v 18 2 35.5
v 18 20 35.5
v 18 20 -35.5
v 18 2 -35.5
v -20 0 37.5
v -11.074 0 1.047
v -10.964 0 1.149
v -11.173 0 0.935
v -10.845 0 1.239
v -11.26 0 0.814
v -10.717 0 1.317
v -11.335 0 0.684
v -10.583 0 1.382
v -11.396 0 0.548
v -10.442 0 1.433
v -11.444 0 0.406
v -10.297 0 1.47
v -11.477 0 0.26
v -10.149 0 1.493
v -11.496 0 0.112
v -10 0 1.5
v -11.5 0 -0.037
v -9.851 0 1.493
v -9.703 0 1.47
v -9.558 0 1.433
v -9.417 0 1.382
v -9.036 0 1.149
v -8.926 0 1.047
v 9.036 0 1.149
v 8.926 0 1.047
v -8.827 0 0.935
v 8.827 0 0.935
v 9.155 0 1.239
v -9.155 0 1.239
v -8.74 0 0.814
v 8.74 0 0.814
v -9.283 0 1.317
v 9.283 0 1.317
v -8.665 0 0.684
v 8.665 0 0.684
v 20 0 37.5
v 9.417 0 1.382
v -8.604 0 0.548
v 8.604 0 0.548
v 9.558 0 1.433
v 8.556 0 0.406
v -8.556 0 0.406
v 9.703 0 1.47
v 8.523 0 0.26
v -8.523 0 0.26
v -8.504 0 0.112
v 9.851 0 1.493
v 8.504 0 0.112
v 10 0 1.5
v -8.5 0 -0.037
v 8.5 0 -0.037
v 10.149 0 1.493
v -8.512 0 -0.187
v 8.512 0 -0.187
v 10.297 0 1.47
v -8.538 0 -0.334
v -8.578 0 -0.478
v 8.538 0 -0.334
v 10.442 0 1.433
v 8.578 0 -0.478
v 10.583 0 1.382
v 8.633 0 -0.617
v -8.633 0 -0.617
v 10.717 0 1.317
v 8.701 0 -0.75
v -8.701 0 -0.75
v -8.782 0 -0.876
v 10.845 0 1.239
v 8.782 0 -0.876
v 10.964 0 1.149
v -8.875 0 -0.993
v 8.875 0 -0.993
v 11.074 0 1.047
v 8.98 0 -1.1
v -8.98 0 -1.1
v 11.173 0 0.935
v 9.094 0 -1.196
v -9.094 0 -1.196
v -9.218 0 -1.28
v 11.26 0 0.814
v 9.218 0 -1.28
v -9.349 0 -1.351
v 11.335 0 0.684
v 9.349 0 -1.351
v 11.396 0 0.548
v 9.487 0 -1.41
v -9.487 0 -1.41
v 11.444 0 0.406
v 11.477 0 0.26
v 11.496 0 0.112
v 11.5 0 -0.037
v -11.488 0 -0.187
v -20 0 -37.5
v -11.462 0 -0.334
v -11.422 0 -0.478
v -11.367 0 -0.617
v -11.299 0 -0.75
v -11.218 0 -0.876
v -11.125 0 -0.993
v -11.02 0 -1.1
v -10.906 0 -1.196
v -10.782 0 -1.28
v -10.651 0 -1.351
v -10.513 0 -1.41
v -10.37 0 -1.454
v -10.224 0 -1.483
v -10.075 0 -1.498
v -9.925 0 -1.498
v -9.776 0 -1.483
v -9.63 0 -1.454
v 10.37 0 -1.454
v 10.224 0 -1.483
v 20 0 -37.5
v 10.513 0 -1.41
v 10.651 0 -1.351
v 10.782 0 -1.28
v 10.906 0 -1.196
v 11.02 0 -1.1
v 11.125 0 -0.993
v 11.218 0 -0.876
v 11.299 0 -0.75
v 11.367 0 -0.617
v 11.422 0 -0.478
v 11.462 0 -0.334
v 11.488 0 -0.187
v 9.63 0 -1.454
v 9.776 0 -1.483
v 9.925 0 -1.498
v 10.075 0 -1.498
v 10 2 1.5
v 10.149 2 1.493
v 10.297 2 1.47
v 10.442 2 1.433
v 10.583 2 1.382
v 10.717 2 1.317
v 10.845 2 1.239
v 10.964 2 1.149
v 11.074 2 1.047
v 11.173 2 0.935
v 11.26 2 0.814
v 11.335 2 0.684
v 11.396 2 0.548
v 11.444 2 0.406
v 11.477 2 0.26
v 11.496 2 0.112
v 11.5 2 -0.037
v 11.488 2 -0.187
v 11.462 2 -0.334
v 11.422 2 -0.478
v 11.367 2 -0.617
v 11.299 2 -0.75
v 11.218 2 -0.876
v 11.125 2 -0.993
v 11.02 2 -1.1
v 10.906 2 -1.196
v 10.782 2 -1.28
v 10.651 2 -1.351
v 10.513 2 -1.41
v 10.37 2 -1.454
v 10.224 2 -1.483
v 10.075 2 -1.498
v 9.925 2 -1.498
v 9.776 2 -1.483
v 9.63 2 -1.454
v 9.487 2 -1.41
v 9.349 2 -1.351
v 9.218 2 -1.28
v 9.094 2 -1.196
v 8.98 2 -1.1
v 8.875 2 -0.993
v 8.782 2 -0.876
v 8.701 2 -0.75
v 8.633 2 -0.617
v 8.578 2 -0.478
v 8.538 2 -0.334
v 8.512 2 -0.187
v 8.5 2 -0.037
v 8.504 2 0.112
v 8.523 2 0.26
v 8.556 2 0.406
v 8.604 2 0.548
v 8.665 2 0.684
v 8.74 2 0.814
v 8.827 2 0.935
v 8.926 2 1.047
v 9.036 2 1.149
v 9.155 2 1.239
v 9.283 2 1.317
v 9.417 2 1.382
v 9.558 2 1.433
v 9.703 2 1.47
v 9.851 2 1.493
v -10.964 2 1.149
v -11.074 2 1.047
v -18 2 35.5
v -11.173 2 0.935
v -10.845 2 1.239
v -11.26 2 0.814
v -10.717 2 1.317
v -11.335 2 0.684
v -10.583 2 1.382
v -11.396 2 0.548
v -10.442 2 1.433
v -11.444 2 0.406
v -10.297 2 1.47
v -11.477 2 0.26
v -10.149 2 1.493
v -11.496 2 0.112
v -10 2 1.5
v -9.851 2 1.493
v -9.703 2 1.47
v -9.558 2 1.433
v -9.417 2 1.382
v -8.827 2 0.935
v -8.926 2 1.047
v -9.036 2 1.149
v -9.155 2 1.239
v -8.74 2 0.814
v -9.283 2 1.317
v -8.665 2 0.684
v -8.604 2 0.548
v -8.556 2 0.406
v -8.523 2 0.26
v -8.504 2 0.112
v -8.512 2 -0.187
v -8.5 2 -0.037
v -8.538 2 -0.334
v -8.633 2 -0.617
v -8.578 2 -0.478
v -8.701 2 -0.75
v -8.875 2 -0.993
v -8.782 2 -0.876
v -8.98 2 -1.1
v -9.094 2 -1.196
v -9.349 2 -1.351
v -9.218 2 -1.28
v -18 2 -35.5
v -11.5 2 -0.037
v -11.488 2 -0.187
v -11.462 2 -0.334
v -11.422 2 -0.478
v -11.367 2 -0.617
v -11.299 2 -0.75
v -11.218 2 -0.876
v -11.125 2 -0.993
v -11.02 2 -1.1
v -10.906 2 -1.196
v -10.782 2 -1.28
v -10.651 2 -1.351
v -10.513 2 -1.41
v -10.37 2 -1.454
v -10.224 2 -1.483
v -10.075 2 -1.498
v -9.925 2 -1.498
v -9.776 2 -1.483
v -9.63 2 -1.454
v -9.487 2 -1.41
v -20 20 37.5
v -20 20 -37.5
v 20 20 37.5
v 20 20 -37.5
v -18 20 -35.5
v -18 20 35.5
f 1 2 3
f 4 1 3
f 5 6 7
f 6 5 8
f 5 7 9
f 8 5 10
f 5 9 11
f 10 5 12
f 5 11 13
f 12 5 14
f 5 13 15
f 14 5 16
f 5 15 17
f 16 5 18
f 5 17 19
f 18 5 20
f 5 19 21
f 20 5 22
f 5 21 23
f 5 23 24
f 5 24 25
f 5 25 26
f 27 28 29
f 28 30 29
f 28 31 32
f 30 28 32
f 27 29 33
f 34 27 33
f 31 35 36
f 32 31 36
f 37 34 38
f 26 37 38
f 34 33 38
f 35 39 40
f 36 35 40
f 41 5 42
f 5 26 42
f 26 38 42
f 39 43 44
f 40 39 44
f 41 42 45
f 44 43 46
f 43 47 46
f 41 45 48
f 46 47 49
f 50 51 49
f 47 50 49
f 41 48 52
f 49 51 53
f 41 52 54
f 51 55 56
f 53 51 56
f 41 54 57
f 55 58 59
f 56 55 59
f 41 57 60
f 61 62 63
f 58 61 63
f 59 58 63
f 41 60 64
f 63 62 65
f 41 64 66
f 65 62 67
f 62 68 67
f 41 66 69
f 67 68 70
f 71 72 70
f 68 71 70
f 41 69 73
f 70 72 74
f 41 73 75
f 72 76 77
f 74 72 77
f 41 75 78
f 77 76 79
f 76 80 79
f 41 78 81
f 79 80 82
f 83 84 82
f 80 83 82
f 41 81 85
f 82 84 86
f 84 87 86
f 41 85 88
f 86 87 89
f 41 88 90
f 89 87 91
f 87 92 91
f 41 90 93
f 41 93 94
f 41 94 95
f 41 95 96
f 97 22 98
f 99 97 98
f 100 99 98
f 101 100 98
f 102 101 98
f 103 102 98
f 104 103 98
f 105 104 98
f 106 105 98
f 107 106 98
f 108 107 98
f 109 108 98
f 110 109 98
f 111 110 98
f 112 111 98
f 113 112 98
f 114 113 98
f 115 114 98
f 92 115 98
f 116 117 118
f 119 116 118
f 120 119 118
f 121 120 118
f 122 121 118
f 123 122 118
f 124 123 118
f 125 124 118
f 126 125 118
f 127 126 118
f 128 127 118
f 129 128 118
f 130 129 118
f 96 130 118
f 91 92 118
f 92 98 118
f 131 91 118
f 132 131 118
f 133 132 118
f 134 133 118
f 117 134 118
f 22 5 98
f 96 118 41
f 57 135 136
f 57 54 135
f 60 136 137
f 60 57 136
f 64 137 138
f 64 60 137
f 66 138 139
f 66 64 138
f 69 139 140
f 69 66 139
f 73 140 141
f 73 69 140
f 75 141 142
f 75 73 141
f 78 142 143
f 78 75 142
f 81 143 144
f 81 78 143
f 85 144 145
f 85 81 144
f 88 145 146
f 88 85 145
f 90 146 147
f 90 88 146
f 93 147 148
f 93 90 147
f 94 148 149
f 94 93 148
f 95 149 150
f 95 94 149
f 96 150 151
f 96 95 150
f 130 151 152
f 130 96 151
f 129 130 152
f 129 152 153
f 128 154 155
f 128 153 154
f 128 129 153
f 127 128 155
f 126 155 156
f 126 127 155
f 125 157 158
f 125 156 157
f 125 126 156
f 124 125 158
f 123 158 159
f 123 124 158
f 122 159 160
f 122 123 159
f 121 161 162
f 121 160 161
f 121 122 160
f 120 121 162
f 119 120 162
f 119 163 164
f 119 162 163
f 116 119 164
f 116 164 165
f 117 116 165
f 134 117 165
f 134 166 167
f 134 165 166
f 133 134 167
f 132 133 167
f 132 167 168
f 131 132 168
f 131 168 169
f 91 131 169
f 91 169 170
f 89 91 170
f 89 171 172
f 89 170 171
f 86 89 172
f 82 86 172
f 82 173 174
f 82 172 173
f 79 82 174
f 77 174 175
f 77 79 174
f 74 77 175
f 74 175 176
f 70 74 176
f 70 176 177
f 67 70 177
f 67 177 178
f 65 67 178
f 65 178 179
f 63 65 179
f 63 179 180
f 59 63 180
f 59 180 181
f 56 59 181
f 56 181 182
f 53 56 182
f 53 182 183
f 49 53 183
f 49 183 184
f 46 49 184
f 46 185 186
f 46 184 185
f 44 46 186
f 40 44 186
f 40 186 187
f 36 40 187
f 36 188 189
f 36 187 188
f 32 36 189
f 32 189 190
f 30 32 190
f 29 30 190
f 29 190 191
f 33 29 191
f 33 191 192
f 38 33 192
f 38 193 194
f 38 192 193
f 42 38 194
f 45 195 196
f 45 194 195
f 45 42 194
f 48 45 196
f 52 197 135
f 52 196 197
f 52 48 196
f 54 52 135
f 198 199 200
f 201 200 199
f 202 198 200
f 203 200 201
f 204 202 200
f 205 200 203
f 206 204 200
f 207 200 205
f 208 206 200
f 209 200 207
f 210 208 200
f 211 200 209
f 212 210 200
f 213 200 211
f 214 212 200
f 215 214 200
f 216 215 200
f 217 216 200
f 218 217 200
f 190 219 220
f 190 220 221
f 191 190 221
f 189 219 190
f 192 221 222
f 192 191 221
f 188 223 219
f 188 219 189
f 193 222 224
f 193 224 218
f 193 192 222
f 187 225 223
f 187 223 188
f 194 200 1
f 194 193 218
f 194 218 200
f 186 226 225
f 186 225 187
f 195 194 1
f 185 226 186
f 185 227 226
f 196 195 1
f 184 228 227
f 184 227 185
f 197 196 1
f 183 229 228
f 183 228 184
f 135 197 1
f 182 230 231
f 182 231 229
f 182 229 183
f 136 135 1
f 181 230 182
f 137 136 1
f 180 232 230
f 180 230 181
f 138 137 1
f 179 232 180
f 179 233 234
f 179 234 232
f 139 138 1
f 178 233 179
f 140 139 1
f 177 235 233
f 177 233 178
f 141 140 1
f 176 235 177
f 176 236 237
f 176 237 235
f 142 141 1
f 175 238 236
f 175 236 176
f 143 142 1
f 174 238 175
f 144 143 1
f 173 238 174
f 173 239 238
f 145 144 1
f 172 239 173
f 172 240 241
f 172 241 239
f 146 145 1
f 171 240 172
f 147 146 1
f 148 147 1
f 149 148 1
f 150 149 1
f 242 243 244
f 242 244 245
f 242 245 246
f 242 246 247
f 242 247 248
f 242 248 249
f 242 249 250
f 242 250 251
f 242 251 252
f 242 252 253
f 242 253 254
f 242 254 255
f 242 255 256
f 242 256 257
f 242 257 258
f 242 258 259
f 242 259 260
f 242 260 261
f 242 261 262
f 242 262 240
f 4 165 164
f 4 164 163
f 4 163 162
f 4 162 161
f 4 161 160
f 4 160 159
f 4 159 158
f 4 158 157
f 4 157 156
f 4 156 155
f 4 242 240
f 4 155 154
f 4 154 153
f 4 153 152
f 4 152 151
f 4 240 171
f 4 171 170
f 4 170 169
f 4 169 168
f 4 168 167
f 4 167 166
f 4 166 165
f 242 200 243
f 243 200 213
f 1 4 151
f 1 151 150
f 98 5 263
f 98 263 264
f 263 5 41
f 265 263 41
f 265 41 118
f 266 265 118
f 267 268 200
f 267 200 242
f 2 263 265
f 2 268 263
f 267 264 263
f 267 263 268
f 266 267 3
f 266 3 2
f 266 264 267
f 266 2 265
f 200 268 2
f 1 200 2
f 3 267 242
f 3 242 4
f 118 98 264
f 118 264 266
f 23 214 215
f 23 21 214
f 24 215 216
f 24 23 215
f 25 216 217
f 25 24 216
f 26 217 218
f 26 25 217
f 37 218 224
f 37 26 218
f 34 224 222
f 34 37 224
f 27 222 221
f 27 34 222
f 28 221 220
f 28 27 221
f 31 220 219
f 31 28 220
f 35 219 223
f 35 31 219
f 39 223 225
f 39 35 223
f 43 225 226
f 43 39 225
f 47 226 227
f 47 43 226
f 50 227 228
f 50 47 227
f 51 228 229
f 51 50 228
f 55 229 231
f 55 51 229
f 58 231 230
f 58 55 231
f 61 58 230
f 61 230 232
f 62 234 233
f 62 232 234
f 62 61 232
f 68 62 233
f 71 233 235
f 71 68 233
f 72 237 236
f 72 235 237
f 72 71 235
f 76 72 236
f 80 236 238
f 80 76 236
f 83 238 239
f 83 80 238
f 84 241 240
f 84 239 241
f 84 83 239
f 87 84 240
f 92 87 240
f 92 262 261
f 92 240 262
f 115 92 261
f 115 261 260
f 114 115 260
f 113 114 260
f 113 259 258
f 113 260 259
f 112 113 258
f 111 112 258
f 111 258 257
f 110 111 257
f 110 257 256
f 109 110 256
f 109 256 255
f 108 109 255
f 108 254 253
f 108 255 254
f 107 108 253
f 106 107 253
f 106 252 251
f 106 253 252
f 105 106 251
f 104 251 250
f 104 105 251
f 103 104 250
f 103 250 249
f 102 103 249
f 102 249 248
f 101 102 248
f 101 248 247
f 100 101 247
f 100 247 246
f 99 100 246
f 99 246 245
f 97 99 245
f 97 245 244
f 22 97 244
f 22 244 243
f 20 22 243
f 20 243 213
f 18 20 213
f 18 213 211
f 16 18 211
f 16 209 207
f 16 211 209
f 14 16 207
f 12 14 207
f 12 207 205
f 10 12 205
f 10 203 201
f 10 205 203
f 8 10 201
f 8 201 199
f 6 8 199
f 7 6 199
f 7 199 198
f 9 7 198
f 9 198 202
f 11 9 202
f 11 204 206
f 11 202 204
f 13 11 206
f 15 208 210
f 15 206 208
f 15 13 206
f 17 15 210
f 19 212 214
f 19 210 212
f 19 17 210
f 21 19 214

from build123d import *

# Parameters (mm, degrees)
SKETCH_1_W              = 40
SKETCH_1_H              = 75
EXTRUDE_1_DEPTH         = 20
SKETCH_2_W              = 36
SKETCH_2_H              = 71
CUT_EXTRUDE_1_DEPTH     = 18
CUT_EXTRUDE4_DEPTH      = 47.97073557
CUT_EXTRUDE4_DEPTH_BACK = 47.97073557
SKETCH1_R               = 1.5


with BuildPart() as part:
    # 스케치1 → 보스-돌출1 (new body)
    with BuildSketch(Plane(origin=(0, 0, 0), x_dir=(1, 0, 0), z_dir=(0, 1, 0))):
        Rectangle(SKETCH_1_W, SKETCH_1_H)
    extrude(amount=EXTRUDE_1_DEPTH)

    # 스케치2 → 컷-돌출1 (cut)
    with BuildSketch(Plane(origin=(0, 20, 0), x_dir=(1, 0, 0), z_dir=(0, 1, 0))):
        Rectangle(SKETCH_2_W, SKETCH_2_H)
    extrude(amount=-CUT_EXTRUDE_1_DEPTH, mode=Mode.SUBTRACT)

    # Sketch1 → Cut-Extrude4 (cut, two sides: drawn at the far end of the back side and taken through both)
    with BuildSketch(Plane(origin=(0, 0, 0), x_dir=(1, 0, 0), z_dir=(0, 1, 0)).offset(-CUT_EXTRUDE4_DEPTH_BACK)):
        with Locations(Location((-10, 0, 0), (0, 0, 270))):
            Circle(SKETCH1_R)
        with Locations(Location((10, 0, 0), (0, 0, 270))):
            Circle(SKETCH1_R)
    extrude(amount=CUT_EXTRUDE4_DEPTH + CUT_EXTRUDE4_DEPTH_BACK, mode=Mode.SUBTRACT)


solid = part.part
